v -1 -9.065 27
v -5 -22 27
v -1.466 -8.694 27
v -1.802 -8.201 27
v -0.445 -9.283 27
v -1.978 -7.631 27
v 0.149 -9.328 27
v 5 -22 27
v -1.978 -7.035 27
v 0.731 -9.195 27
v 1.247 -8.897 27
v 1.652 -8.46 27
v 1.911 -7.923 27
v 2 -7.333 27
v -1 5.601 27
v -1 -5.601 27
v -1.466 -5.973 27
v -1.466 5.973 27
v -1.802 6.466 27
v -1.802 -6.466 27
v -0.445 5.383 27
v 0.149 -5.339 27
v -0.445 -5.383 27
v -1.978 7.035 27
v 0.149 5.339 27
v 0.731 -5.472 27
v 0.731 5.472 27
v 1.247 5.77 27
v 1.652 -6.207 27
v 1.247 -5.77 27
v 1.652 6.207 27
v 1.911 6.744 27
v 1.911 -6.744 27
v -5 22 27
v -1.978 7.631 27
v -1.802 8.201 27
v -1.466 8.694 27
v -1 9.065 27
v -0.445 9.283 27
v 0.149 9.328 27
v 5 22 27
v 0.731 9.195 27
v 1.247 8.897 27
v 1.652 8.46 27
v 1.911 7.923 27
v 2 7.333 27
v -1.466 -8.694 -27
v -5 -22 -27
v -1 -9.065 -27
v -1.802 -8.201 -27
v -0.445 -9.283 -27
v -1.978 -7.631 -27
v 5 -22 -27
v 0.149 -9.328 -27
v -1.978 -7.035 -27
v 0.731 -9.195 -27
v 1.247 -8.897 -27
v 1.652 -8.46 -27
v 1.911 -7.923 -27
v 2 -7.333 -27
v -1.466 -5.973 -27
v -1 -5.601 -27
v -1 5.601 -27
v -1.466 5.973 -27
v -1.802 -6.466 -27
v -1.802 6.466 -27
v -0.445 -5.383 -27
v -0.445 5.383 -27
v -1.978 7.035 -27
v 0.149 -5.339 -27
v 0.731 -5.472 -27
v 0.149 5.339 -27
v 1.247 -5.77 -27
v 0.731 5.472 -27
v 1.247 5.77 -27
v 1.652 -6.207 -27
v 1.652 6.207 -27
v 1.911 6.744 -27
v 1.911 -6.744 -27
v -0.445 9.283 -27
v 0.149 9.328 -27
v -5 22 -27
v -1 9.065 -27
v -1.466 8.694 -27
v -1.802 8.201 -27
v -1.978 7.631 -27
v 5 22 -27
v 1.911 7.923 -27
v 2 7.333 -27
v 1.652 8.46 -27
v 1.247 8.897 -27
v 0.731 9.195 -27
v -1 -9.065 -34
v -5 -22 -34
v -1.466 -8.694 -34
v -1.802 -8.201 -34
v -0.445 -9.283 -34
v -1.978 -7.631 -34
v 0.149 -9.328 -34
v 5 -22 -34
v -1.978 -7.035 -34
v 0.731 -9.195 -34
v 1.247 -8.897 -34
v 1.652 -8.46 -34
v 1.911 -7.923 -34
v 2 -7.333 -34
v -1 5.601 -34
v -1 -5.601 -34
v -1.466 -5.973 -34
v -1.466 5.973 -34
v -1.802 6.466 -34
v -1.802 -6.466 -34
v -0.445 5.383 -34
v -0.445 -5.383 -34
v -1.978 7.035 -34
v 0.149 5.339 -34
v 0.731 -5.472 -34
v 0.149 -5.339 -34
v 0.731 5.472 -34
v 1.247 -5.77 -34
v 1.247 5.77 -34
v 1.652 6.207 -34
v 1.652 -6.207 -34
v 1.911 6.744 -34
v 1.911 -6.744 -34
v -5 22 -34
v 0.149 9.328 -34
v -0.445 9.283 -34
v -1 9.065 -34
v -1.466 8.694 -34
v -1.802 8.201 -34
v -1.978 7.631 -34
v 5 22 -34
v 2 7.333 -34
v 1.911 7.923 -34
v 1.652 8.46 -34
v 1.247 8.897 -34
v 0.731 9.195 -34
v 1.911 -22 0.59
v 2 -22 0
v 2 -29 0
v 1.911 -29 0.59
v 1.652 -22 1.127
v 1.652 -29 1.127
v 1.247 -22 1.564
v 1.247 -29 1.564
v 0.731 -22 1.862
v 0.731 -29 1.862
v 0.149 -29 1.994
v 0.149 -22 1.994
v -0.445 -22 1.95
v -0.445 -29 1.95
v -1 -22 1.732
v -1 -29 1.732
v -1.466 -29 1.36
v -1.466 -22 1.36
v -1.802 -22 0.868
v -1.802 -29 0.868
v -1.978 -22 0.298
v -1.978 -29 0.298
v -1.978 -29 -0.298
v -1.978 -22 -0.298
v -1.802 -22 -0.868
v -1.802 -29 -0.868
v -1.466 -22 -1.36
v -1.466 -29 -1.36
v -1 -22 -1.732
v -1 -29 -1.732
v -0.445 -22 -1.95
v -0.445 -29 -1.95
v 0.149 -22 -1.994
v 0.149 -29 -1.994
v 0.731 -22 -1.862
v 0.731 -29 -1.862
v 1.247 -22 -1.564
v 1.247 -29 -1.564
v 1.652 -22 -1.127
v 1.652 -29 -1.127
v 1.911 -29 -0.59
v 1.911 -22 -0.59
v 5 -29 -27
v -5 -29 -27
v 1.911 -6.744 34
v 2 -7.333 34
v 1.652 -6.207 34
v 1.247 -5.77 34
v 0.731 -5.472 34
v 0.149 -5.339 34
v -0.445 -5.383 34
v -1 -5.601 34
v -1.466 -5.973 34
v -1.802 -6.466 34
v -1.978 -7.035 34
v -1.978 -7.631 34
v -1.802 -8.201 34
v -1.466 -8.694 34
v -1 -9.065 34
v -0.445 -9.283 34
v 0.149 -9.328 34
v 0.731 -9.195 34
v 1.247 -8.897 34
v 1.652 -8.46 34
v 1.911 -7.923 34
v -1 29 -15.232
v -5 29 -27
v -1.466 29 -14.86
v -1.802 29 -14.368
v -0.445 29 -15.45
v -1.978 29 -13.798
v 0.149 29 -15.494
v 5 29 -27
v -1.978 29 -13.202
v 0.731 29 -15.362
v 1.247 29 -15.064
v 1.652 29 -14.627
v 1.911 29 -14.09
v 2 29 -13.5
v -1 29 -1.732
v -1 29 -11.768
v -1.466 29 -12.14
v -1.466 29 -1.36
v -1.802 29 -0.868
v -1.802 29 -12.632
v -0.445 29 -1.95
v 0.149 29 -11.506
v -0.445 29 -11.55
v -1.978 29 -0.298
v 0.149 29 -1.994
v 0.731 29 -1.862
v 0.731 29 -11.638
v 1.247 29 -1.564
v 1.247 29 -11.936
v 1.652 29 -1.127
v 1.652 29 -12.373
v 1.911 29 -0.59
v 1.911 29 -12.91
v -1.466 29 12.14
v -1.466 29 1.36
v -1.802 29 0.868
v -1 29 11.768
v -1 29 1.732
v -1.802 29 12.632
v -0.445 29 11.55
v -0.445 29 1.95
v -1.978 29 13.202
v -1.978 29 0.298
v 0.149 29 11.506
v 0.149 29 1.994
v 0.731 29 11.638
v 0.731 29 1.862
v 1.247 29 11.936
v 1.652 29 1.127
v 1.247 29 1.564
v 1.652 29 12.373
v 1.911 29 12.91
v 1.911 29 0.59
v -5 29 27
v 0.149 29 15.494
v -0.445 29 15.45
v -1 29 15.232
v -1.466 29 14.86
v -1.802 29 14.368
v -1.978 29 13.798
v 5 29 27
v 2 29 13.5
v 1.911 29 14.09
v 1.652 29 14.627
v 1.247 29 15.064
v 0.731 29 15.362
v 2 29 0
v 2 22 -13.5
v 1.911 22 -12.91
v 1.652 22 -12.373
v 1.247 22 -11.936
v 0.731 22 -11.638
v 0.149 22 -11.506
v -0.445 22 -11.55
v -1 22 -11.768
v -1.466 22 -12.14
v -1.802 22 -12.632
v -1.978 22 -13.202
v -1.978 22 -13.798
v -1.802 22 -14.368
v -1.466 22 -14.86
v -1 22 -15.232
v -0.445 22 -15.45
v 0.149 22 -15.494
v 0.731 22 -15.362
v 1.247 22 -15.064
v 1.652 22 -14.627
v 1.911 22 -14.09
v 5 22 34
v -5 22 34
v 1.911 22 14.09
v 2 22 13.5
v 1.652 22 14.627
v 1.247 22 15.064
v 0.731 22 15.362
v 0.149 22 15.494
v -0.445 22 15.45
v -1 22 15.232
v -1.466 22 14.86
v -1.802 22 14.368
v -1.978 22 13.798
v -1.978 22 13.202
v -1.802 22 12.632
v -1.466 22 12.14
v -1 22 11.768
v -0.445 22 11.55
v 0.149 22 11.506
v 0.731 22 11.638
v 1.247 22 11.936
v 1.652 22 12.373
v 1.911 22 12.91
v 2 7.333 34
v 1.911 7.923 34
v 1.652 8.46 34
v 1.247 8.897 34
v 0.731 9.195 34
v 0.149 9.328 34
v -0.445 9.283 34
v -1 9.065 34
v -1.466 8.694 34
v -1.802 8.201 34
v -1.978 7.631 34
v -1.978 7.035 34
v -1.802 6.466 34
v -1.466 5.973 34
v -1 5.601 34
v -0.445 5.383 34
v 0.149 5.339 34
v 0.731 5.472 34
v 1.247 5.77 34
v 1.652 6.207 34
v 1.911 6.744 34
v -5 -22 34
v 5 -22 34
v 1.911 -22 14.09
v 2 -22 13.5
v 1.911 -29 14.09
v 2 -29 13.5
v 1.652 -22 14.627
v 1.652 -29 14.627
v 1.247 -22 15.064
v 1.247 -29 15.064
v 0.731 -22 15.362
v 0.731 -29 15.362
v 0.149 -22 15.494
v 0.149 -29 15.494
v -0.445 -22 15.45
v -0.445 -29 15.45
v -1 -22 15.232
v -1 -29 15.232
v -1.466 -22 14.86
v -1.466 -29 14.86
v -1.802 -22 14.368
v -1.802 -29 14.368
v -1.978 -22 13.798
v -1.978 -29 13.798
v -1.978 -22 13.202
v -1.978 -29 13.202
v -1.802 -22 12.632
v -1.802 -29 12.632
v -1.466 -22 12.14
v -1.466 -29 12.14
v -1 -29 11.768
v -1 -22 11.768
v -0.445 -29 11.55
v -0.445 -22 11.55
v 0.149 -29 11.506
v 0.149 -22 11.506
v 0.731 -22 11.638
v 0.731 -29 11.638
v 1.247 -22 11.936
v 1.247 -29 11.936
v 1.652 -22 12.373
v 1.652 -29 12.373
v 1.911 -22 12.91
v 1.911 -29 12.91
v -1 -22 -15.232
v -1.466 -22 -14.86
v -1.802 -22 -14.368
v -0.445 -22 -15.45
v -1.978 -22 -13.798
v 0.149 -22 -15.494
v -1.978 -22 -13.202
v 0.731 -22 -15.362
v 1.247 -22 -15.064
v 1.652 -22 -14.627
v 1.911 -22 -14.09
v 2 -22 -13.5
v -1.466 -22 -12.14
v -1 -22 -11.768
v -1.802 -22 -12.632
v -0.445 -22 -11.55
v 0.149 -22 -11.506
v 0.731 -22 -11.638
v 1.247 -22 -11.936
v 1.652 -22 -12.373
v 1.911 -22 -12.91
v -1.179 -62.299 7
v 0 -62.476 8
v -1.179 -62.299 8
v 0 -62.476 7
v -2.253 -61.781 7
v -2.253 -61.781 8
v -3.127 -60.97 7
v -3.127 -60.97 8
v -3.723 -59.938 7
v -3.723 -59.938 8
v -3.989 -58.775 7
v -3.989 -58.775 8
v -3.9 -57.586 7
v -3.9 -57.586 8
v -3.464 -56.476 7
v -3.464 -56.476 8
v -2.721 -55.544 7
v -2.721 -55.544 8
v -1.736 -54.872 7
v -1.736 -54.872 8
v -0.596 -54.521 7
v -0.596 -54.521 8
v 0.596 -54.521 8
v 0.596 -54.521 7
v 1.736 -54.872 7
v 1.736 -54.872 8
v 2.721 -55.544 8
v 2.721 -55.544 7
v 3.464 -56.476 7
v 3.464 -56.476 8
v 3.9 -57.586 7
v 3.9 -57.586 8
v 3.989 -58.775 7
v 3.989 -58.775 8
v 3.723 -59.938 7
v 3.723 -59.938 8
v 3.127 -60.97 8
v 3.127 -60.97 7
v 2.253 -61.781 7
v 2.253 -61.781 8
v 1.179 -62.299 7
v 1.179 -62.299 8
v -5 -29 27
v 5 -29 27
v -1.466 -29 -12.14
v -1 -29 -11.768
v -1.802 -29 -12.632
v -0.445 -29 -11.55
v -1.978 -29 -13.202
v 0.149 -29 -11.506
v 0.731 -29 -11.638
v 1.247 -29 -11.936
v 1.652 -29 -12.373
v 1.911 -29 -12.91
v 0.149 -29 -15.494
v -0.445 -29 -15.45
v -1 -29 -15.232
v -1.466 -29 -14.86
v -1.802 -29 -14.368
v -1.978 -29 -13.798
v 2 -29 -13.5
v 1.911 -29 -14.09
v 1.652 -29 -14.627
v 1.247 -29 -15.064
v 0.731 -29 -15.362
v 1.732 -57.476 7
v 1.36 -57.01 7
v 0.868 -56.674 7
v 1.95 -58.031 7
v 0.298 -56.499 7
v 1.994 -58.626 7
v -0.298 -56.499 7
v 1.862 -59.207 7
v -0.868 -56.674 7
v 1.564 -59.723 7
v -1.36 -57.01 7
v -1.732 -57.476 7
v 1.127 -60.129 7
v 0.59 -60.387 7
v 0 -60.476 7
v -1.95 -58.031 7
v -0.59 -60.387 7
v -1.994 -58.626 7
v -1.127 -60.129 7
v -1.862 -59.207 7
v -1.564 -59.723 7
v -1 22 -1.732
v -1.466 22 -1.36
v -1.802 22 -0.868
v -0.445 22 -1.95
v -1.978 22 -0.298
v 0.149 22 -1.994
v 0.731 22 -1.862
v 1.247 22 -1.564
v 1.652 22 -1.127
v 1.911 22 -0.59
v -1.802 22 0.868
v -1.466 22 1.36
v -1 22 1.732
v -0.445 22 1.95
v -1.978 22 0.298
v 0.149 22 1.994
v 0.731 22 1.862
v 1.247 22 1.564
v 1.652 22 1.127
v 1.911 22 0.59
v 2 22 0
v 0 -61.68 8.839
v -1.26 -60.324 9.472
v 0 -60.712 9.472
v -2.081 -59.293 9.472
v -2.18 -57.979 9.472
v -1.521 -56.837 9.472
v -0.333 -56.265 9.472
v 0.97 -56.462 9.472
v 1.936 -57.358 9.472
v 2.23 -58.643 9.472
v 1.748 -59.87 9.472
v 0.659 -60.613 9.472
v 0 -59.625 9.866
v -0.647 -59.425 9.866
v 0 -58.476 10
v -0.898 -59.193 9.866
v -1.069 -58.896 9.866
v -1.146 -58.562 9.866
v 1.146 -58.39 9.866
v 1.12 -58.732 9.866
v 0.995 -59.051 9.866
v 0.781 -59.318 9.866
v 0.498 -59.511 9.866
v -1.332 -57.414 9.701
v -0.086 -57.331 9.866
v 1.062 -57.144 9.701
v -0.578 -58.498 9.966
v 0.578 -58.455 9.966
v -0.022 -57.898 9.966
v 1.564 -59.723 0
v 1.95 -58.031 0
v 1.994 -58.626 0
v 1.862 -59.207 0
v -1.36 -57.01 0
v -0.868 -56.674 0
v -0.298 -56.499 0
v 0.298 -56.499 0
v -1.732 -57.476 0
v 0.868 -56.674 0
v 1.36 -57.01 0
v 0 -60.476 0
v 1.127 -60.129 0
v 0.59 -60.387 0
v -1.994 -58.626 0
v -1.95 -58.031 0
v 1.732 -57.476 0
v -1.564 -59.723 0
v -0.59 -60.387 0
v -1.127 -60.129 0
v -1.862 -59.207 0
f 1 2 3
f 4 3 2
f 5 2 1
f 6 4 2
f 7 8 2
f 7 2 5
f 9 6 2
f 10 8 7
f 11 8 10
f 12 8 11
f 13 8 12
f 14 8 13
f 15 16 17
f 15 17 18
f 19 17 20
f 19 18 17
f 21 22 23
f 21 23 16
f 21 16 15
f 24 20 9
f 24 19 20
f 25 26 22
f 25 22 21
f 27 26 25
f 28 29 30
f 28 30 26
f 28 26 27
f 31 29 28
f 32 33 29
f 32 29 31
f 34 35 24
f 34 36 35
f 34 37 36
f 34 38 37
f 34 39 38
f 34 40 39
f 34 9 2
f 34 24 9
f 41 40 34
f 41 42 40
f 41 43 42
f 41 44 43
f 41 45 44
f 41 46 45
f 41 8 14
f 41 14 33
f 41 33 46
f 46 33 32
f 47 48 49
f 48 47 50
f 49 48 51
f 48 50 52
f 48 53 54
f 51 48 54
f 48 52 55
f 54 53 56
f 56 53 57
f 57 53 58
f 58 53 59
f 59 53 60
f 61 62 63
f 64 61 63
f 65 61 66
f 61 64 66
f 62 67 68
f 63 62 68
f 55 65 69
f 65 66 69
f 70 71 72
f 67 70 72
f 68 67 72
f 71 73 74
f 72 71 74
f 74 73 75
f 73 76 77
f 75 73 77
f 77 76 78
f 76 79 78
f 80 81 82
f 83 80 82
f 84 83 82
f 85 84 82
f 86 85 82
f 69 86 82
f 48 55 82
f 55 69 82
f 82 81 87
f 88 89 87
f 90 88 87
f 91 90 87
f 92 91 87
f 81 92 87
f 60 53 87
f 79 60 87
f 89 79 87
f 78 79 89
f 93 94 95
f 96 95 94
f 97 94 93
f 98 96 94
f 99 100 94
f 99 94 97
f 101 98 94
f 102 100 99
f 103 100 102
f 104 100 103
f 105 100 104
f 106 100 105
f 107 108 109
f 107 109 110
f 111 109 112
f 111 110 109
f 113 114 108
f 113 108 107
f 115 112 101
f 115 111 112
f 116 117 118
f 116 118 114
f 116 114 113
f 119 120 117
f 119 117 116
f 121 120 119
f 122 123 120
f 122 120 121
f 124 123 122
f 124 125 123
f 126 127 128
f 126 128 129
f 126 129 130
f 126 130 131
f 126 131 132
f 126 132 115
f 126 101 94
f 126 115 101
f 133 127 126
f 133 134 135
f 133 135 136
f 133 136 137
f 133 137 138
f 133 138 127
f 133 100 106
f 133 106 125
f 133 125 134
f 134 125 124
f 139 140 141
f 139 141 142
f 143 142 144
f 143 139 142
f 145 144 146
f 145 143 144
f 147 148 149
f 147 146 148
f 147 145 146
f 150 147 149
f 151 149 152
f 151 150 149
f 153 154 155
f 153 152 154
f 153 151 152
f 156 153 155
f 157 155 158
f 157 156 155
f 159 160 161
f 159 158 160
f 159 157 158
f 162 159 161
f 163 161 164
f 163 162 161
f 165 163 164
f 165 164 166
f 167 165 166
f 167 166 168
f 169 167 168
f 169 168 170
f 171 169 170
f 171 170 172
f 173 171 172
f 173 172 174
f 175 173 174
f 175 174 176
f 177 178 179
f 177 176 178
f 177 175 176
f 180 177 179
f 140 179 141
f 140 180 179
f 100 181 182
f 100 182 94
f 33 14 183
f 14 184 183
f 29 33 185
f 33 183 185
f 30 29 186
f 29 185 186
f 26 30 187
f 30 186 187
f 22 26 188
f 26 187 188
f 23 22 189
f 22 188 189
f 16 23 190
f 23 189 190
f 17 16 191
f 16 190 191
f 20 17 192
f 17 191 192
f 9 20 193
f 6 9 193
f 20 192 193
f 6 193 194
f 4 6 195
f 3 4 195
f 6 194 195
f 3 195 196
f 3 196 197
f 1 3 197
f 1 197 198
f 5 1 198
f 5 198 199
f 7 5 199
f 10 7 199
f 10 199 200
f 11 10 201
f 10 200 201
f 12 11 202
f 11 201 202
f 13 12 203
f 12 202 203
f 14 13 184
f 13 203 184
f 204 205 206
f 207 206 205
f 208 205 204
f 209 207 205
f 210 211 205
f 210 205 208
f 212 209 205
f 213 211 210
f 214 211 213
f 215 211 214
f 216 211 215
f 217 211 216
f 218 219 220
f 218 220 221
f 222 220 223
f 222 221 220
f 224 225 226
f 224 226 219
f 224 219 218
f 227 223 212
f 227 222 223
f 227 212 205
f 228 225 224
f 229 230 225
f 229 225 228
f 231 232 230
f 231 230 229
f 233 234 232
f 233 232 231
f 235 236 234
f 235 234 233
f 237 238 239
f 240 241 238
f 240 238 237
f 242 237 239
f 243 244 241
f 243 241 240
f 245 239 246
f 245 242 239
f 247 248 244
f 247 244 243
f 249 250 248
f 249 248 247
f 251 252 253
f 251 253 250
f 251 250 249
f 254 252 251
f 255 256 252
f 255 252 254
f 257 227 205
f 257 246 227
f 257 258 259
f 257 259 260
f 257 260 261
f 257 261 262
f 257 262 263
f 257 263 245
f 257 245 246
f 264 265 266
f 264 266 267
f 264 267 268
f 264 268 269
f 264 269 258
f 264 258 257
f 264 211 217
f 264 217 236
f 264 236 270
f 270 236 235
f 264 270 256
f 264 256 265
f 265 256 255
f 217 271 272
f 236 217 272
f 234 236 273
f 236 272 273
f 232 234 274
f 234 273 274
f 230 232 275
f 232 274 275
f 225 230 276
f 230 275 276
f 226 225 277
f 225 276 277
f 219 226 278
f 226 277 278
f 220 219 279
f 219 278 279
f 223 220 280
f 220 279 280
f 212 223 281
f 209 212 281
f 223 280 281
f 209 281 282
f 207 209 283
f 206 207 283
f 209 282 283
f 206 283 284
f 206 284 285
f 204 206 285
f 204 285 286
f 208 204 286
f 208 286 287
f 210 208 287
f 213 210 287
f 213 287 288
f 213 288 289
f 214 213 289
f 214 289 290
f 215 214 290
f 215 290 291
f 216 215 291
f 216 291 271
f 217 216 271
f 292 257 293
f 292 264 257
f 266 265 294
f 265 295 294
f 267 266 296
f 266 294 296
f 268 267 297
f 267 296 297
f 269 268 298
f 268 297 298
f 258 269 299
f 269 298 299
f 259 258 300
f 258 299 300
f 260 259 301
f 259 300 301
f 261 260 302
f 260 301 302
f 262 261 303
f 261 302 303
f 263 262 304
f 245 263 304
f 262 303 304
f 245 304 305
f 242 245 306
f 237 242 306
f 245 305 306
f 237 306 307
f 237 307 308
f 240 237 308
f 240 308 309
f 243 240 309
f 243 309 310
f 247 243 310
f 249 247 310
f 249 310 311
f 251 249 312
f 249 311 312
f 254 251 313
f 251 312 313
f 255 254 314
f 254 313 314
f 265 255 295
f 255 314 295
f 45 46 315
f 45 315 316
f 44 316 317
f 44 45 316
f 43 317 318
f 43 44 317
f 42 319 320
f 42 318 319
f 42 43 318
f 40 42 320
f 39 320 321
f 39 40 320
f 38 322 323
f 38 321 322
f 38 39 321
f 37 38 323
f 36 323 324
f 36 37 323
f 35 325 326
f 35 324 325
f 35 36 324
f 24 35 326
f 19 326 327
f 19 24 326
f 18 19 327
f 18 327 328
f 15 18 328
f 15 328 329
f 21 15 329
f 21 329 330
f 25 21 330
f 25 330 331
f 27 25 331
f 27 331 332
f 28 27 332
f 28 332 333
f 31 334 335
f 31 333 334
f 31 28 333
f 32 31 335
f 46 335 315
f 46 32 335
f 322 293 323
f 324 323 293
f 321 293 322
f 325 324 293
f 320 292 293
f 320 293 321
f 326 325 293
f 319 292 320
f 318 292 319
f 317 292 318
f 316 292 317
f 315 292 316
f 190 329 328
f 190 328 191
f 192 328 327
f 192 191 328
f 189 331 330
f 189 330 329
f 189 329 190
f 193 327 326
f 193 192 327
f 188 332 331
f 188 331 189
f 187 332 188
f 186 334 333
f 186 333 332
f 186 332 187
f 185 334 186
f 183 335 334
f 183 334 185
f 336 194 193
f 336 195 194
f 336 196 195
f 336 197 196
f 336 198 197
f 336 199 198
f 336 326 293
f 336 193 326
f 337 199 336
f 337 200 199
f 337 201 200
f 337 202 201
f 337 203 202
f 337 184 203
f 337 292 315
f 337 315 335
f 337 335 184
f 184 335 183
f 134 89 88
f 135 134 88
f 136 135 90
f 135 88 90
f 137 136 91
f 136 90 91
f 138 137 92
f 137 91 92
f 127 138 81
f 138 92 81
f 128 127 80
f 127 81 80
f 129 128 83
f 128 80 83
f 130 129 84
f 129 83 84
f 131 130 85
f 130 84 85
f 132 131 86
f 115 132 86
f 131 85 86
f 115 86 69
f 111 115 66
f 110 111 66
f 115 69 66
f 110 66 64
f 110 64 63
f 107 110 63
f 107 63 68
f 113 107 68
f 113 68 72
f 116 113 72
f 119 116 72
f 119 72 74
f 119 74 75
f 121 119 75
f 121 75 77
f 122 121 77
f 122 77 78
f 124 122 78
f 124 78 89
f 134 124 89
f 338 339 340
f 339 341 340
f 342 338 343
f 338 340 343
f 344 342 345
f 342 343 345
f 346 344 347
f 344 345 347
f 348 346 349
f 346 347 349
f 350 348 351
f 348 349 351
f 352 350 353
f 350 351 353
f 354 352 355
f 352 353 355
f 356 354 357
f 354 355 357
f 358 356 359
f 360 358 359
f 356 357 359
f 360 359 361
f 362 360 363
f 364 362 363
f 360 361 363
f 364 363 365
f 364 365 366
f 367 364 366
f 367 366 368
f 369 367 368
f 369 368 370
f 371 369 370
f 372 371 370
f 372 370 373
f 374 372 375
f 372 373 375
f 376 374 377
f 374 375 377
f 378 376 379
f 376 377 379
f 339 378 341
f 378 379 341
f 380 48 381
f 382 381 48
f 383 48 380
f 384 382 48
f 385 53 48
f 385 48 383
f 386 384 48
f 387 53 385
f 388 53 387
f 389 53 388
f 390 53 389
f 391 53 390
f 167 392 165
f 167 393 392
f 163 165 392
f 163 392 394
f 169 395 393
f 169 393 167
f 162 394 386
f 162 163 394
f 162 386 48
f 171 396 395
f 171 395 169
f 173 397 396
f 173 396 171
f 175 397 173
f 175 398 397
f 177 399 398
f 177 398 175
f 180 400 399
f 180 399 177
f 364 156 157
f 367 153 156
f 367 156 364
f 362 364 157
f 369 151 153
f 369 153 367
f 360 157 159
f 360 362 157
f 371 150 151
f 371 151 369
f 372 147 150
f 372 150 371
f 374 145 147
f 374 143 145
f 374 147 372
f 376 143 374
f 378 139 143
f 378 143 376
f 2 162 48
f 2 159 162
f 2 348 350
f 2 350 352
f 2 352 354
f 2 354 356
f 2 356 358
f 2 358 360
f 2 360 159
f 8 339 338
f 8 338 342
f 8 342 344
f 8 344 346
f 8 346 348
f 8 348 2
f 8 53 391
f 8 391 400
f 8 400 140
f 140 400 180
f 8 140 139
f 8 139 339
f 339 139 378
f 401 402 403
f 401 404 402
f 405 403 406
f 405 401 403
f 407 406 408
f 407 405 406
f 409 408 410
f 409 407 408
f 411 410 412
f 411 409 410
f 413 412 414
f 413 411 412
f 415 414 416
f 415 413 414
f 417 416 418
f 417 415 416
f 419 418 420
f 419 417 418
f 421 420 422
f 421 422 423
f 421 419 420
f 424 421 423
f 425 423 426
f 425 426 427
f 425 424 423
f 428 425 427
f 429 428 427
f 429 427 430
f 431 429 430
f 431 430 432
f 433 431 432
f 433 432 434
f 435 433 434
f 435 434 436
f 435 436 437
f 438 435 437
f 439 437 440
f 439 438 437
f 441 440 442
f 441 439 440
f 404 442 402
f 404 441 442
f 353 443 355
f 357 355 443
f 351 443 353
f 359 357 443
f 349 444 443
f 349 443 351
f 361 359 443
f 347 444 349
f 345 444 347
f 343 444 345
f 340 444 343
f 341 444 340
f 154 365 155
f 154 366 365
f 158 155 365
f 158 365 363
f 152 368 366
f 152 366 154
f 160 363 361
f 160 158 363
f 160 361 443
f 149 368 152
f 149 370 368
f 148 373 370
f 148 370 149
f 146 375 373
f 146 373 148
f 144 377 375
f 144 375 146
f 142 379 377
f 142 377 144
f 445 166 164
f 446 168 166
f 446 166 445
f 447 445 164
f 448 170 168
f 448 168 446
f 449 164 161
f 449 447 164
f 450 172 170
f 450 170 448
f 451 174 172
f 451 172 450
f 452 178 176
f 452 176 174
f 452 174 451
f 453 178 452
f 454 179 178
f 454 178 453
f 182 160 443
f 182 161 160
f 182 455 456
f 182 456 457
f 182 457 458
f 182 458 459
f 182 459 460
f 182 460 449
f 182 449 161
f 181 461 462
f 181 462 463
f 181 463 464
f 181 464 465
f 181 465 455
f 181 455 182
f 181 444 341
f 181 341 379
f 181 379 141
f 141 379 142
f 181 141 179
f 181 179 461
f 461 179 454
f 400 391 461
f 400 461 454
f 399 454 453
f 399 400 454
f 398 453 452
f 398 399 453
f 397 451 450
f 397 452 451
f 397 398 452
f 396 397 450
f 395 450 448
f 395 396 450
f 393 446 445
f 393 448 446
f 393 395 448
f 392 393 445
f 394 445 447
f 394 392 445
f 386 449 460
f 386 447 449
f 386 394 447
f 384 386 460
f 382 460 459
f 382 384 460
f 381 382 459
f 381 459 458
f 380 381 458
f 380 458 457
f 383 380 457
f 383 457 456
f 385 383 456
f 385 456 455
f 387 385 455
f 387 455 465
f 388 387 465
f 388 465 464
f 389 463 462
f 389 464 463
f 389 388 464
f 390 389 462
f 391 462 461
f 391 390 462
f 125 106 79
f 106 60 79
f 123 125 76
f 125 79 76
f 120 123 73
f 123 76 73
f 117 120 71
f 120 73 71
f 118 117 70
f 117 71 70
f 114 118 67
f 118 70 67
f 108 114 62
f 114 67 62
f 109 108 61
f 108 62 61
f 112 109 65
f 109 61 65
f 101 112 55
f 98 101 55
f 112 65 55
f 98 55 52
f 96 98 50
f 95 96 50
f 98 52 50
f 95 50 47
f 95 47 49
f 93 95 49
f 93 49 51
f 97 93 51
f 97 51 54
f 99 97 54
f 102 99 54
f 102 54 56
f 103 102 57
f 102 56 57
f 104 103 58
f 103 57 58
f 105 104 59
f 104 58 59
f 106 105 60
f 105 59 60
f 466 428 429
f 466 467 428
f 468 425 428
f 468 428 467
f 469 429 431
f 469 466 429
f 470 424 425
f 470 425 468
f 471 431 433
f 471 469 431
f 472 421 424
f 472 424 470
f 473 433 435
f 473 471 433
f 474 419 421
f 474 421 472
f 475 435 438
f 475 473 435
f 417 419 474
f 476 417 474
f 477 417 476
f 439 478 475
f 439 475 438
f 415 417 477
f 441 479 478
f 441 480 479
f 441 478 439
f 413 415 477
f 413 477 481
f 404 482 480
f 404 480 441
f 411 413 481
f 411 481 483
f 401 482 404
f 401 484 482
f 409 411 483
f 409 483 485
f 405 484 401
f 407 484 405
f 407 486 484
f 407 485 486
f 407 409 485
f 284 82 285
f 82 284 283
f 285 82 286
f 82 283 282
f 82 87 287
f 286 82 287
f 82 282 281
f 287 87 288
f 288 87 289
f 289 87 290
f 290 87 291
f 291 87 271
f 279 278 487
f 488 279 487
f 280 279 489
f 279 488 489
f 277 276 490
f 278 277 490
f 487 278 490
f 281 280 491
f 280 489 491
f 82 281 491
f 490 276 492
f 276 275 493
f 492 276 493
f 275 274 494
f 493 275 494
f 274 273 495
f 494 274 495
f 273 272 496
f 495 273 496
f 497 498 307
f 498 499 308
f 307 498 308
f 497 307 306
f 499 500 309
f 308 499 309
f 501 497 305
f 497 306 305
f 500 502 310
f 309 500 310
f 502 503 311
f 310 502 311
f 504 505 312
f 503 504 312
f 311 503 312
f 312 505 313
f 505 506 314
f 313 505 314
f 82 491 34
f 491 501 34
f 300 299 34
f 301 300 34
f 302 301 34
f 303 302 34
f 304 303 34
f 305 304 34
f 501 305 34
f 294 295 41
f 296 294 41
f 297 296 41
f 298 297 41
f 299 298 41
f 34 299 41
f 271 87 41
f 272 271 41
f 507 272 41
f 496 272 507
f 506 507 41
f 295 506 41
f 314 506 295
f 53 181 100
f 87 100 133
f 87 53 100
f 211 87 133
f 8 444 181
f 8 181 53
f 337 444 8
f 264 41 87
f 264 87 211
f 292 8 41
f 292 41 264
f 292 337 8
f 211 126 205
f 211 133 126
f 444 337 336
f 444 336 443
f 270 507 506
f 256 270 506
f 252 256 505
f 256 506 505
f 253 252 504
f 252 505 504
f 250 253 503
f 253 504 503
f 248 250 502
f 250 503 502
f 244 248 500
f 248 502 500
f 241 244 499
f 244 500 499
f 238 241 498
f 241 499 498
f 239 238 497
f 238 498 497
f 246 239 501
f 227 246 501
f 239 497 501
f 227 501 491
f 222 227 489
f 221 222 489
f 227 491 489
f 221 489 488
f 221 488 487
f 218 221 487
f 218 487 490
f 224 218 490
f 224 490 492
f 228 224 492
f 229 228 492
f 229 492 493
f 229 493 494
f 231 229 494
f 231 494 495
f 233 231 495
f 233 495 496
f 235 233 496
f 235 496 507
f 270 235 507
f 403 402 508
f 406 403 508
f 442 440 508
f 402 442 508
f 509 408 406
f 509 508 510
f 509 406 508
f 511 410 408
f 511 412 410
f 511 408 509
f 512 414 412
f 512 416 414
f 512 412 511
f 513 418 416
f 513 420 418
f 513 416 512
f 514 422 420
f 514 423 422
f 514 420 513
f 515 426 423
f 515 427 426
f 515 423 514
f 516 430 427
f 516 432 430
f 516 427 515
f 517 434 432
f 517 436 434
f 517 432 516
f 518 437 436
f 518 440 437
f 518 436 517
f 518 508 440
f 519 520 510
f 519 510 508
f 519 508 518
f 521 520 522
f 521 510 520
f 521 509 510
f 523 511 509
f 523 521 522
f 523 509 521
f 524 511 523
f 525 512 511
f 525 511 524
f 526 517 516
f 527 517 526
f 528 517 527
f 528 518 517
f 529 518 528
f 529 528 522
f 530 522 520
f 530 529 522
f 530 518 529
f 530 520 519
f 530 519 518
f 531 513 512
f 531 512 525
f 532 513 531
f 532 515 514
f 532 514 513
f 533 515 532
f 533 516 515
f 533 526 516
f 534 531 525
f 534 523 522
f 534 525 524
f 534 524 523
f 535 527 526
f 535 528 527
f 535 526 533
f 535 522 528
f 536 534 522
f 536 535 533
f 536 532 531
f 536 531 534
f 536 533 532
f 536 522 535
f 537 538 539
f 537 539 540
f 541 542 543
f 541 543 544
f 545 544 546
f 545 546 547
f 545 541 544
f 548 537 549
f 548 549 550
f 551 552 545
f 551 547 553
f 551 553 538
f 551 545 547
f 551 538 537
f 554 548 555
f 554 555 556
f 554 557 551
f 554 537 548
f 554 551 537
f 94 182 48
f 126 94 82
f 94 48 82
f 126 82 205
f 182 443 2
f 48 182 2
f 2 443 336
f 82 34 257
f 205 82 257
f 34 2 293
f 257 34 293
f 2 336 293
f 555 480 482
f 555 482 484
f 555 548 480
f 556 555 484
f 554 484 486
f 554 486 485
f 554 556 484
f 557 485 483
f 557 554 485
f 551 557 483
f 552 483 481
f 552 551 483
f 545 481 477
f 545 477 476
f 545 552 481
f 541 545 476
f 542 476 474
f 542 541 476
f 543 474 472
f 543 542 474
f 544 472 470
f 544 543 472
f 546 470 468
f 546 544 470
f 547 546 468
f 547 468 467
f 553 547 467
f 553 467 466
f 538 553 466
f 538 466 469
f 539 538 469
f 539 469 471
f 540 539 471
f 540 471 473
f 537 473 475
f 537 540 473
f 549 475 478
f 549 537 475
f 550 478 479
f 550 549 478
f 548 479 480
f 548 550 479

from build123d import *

# Parameters (mm, degrees)
F0_W     = 44
F0_H     = 54
F1_DEPTH = 5
F2_R     = 2
F3_DEPTH = 44
F4_R     = 2
F5_DEPTH = 36.4


with BuildPart() as f1:
    # F0 (on Right) → F1 (new body, symmetric)
    with BuildSketch(Plane.YZ):
        Polygon((22, 34), (-22, 34), (-29, 27), (-29, -27), (-22, -34), (22, -34), (29, -27), (29, 27), align=None)
        Rectangle(F0_W, F0_H, mode=Mode.SUBTRACT)
    extrude(amount=F1_DEPTH, both=True)

    # F2 (on Top) → F3 (cut, symmetric)
    with BuildSketch(Plane.XY):
        with Locations((0, 7.333333)):
            Circle(F2_R)
        with Locations((0, -7.333333)):
            Circle(F2_R)
    extrude(amount=F3_DEPTH, both=True, mode=Mode.SUBTRACT)

    # F4 (on Front) → F5 (cut, symmetric)
    with BuildSketch(Plane.XZ):
        with Locations((0, -13.5)):
            Circle(F4_R)
        Circle(F4_R)
        with Locations((0, 13.5)):
            Circle(F4_R)
    extrude(amount=F5_DEPTH, both=True, mode=Mode.SUBTRACT)


with BuildPart() as f6:
    # F0 (on Right) → F6 (revolve)
    with BuildSketch(Plane.YZ):
        with BuildLine():
            Line((-60.476262, 0), (-58.476262, 0))
            Line((-58.476262, 0), (-58.476262, 10))
            ThreePointArc((-58.476262, 10), (-60.71233, 9.472136), (-62.476262, 8))
            Line((-62.476262, 8), (-62.476262, 7))
            Line((-62.476262, 7), (-60.476262, 7))
            Line((-60.476262, 7), (-60.476262, 0))
        make_face()
    revolve(axis=Axis((0, -58.476262, -6.262247), (0, 0, -1)))


solid = Compound([f1.part, f6.part])
